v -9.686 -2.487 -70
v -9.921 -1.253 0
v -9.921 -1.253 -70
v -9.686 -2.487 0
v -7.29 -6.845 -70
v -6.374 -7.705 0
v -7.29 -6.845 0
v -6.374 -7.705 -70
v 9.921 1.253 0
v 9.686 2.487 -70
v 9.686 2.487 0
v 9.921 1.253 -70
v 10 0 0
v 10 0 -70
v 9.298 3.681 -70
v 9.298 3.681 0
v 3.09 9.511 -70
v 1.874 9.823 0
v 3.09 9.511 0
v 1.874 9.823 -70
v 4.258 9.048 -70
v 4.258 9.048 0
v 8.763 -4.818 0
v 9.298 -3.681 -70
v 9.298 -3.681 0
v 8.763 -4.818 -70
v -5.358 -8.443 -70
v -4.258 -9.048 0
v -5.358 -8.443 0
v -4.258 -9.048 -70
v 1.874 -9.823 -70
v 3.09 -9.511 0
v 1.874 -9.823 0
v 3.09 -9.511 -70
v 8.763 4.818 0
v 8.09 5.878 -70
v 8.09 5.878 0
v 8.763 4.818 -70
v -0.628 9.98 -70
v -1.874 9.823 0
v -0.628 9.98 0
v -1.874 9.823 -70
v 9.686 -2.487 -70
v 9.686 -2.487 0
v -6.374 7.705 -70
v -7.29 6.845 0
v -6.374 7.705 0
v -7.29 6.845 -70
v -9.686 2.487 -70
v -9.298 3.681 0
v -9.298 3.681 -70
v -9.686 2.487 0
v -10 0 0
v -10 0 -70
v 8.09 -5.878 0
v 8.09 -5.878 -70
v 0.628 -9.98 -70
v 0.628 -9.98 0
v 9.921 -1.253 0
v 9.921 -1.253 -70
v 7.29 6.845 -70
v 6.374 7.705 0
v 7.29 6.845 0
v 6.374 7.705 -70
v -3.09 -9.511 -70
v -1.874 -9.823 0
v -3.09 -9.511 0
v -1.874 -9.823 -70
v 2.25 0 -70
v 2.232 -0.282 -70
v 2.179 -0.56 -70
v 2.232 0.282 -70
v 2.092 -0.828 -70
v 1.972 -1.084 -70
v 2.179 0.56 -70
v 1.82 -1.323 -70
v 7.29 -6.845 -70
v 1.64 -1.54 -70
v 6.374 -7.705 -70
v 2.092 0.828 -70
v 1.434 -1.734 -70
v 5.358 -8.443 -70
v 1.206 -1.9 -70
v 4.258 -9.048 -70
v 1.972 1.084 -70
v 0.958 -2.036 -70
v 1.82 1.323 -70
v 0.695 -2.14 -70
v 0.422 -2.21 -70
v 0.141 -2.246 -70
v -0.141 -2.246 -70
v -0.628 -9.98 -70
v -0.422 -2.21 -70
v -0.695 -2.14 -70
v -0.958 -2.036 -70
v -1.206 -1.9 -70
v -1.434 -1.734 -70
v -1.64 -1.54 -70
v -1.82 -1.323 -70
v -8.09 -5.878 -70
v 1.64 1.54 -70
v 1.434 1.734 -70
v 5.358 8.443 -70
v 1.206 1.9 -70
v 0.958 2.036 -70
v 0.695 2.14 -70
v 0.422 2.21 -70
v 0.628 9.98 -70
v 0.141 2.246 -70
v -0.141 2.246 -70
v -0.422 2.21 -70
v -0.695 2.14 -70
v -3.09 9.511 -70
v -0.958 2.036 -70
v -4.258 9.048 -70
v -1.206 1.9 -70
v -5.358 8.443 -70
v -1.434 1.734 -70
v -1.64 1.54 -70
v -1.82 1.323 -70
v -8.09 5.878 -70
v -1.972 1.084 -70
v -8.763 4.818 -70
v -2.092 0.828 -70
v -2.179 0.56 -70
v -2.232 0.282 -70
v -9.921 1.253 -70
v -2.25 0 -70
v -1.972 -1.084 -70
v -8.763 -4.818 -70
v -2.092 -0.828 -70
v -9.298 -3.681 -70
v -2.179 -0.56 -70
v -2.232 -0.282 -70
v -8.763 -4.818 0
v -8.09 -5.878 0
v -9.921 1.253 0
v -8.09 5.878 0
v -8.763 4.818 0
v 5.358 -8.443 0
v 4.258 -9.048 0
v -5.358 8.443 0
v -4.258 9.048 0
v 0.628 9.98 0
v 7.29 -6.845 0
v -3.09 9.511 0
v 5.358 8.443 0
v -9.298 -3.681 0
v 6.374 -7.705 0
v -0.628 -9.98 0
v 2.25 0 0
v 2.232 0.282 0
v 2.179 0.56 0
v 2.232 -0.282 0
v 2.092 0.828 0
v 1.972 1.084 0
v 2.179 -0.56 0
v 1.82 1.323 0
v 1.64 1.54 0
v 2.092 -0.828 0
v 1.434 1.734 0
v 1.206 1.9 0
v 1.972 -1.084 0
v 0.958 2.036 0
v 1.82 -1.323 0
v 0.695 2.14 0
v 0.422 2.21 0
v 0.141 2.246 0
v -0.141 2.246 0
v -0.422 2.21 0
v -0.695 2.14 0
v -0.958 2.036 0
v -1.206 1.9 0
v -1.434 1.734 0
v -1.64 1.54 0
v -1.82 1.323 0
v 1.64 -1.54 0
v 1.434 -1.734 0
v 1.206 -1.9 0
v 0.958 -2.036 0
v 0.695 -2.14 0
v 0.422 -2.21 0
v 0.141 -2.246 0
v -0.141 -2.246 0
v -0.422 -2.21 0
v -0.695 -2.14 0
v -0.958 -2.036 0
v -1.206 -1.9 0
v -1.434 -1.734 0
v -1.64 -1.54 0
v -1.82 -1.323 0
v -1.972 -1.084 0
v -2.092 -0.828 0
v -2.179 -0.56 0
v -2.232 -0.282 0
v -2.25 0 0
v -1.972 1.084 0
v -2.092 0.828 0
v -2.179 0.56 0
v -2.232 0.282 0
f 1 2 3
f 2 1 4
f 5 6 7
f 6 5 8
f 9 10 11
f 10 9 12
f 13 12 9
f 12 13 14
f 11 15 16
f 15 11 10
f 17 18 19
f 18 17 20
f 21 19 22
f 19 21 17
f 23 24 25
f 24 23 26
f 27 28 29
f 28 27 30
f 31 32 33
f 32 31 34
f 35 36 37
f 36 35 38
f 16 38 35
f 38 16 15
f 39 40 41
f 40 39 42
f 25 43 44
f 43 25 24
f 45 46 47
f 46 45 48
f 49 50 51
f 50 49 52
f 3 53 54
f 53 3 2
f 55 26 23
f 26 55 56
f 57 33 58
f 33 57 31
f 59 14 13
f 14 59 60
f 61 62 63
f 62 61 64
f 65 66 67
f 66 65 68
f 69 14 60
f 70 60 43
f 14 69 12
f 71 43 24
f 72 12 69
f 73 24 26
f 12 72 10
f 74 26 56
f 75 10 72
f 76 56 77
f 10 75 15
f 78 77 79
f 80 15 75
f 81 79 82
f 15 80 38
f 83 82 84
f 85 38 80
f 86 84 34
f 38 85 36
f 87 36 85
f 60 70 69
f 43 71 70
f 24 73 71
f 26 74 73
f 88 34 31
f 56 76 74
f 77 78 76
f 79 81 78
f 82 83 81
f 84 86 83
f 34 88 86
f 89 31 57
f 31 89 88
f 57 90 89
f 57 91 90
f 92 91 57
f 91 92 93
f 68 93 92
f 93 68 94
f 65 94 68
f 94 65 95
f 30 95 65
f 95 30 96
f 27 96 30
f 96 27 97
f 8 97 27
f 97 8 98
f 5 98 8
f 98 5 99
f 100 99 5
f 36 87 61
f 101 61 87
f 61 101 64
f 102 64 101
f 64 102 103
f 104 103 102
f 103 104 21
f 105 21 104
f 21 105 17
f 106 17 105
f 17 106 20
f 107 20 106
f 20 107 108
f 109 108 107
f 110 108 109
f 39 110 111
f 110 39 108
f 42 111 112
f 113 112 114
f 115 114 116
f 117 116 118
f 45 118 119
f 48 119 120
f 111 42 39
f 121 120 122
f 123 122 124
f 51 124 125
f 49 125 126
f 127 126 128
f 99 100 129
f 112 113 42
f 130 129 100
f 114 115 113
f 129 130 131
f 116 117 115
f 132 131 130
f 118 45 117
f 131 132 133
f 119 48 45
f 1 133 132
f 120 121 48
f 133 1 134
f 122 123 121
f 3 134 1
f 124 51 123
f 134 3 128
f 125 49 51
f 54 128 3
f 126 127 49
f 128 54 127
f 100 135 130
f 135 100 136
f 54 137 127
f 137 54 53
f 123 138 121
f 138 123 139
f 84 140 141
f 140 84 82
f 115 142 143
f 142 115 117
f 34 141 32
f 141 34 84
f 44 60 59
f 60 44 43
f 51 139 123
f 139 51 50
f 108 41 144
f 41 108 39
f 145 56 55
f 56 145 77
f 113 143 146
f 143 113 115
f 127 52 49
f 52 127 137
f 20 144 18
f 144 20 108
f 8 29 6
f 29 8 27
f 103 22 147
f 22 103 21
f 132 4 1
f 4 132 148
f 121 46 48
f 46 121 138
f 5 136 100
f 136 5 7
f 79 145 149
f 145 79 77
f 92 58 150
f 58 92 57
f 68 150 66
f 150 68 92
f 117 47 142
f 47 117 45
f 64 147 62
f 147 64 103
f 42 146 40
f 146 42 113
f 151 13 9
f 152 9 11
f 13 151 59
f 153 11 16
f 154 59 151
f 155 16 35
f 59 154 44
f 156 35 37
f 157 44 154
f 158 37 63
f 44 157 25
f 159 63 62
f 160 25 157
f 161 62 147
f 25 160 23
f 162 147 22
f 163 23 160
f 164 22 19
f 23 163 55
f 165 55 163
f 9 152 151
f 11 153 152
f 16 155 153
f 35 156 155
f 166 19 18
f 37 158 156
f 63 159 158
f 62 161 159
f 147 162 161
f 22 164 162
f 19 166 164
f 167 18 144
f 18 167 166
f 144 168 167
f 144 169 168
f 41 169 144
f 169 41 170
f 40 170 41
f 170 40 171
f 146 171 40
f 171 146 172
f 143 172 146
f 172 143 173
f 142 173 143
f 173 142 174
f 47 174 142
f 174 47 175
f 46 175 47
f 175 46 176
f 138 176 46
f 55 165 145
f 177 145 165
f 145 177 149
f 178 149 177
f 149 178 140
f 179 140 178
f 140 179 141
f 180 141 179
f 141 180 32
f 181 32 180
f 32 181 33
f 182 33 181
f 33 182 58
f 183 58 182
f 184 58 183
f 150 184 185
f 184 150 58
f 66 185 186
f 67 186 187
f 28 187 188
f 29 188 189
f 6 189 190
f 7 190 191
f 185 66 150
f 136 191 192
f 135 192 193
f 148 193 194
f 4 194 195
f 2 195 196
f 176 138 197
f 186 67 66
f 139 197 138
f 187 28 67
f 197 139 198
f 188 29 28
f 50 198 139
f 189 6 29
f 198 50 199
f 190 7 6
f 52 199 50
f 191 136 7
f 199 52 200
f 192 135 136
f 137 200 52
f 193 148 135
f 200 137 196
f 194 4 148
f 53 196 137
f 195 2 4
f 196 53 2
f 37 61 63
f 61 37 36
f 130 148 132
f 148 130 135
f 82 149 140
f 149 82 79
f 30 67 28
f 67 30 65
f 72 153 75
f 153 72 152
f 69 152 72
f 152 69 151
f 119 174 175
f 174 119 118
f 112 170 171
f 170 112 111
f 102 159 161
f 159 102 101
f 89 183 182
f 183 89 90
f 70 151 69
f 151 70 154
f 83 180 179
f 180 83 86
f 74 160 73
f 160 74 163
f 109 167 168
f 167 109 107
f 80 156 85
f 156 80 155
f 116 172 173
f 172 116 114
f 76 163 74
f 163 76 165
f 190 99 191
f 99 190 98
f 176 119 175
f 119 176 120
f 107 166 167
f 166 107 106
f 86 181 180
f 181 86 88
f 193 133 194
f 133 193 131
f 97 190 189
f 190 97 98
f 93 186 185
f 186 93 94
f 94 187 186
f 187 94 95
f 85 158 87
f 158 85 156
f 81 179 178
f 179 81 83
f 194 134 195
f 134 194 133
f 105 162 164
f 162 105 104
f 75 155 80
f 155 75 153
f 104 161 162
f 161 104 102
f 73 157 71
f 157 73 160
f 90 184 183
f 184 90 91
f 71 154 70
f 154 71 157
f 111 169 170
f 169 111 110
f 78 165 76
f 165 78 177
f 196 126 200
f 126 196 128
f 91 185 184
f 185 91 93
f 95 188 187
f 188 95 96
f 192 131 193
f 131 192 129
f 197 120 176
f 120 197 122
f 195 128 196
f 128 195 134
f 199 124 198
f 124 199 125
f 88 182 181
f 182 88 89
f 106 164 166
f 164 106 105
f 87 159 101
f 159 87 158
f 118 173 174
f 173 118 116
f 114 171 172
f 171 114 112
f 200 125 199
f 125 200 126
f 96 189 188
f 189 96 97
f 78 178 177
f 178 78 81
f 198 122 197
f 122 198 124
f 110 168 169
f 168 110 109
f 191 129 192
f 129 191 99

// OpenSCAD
$fn = 50;


difference() {
	union() {
		translate(v = [0, 0, -70.0000000000]) {
			cylinder(h = 70, r = 10.0000000000);
		}
		cylinder(h = 0, r = 20.0000000000);
	}
	union() {
		#translate(v = [0, 0, -70]) {
			cylinder(h = 70, r = 2.2500000000);
		}
	}
}
